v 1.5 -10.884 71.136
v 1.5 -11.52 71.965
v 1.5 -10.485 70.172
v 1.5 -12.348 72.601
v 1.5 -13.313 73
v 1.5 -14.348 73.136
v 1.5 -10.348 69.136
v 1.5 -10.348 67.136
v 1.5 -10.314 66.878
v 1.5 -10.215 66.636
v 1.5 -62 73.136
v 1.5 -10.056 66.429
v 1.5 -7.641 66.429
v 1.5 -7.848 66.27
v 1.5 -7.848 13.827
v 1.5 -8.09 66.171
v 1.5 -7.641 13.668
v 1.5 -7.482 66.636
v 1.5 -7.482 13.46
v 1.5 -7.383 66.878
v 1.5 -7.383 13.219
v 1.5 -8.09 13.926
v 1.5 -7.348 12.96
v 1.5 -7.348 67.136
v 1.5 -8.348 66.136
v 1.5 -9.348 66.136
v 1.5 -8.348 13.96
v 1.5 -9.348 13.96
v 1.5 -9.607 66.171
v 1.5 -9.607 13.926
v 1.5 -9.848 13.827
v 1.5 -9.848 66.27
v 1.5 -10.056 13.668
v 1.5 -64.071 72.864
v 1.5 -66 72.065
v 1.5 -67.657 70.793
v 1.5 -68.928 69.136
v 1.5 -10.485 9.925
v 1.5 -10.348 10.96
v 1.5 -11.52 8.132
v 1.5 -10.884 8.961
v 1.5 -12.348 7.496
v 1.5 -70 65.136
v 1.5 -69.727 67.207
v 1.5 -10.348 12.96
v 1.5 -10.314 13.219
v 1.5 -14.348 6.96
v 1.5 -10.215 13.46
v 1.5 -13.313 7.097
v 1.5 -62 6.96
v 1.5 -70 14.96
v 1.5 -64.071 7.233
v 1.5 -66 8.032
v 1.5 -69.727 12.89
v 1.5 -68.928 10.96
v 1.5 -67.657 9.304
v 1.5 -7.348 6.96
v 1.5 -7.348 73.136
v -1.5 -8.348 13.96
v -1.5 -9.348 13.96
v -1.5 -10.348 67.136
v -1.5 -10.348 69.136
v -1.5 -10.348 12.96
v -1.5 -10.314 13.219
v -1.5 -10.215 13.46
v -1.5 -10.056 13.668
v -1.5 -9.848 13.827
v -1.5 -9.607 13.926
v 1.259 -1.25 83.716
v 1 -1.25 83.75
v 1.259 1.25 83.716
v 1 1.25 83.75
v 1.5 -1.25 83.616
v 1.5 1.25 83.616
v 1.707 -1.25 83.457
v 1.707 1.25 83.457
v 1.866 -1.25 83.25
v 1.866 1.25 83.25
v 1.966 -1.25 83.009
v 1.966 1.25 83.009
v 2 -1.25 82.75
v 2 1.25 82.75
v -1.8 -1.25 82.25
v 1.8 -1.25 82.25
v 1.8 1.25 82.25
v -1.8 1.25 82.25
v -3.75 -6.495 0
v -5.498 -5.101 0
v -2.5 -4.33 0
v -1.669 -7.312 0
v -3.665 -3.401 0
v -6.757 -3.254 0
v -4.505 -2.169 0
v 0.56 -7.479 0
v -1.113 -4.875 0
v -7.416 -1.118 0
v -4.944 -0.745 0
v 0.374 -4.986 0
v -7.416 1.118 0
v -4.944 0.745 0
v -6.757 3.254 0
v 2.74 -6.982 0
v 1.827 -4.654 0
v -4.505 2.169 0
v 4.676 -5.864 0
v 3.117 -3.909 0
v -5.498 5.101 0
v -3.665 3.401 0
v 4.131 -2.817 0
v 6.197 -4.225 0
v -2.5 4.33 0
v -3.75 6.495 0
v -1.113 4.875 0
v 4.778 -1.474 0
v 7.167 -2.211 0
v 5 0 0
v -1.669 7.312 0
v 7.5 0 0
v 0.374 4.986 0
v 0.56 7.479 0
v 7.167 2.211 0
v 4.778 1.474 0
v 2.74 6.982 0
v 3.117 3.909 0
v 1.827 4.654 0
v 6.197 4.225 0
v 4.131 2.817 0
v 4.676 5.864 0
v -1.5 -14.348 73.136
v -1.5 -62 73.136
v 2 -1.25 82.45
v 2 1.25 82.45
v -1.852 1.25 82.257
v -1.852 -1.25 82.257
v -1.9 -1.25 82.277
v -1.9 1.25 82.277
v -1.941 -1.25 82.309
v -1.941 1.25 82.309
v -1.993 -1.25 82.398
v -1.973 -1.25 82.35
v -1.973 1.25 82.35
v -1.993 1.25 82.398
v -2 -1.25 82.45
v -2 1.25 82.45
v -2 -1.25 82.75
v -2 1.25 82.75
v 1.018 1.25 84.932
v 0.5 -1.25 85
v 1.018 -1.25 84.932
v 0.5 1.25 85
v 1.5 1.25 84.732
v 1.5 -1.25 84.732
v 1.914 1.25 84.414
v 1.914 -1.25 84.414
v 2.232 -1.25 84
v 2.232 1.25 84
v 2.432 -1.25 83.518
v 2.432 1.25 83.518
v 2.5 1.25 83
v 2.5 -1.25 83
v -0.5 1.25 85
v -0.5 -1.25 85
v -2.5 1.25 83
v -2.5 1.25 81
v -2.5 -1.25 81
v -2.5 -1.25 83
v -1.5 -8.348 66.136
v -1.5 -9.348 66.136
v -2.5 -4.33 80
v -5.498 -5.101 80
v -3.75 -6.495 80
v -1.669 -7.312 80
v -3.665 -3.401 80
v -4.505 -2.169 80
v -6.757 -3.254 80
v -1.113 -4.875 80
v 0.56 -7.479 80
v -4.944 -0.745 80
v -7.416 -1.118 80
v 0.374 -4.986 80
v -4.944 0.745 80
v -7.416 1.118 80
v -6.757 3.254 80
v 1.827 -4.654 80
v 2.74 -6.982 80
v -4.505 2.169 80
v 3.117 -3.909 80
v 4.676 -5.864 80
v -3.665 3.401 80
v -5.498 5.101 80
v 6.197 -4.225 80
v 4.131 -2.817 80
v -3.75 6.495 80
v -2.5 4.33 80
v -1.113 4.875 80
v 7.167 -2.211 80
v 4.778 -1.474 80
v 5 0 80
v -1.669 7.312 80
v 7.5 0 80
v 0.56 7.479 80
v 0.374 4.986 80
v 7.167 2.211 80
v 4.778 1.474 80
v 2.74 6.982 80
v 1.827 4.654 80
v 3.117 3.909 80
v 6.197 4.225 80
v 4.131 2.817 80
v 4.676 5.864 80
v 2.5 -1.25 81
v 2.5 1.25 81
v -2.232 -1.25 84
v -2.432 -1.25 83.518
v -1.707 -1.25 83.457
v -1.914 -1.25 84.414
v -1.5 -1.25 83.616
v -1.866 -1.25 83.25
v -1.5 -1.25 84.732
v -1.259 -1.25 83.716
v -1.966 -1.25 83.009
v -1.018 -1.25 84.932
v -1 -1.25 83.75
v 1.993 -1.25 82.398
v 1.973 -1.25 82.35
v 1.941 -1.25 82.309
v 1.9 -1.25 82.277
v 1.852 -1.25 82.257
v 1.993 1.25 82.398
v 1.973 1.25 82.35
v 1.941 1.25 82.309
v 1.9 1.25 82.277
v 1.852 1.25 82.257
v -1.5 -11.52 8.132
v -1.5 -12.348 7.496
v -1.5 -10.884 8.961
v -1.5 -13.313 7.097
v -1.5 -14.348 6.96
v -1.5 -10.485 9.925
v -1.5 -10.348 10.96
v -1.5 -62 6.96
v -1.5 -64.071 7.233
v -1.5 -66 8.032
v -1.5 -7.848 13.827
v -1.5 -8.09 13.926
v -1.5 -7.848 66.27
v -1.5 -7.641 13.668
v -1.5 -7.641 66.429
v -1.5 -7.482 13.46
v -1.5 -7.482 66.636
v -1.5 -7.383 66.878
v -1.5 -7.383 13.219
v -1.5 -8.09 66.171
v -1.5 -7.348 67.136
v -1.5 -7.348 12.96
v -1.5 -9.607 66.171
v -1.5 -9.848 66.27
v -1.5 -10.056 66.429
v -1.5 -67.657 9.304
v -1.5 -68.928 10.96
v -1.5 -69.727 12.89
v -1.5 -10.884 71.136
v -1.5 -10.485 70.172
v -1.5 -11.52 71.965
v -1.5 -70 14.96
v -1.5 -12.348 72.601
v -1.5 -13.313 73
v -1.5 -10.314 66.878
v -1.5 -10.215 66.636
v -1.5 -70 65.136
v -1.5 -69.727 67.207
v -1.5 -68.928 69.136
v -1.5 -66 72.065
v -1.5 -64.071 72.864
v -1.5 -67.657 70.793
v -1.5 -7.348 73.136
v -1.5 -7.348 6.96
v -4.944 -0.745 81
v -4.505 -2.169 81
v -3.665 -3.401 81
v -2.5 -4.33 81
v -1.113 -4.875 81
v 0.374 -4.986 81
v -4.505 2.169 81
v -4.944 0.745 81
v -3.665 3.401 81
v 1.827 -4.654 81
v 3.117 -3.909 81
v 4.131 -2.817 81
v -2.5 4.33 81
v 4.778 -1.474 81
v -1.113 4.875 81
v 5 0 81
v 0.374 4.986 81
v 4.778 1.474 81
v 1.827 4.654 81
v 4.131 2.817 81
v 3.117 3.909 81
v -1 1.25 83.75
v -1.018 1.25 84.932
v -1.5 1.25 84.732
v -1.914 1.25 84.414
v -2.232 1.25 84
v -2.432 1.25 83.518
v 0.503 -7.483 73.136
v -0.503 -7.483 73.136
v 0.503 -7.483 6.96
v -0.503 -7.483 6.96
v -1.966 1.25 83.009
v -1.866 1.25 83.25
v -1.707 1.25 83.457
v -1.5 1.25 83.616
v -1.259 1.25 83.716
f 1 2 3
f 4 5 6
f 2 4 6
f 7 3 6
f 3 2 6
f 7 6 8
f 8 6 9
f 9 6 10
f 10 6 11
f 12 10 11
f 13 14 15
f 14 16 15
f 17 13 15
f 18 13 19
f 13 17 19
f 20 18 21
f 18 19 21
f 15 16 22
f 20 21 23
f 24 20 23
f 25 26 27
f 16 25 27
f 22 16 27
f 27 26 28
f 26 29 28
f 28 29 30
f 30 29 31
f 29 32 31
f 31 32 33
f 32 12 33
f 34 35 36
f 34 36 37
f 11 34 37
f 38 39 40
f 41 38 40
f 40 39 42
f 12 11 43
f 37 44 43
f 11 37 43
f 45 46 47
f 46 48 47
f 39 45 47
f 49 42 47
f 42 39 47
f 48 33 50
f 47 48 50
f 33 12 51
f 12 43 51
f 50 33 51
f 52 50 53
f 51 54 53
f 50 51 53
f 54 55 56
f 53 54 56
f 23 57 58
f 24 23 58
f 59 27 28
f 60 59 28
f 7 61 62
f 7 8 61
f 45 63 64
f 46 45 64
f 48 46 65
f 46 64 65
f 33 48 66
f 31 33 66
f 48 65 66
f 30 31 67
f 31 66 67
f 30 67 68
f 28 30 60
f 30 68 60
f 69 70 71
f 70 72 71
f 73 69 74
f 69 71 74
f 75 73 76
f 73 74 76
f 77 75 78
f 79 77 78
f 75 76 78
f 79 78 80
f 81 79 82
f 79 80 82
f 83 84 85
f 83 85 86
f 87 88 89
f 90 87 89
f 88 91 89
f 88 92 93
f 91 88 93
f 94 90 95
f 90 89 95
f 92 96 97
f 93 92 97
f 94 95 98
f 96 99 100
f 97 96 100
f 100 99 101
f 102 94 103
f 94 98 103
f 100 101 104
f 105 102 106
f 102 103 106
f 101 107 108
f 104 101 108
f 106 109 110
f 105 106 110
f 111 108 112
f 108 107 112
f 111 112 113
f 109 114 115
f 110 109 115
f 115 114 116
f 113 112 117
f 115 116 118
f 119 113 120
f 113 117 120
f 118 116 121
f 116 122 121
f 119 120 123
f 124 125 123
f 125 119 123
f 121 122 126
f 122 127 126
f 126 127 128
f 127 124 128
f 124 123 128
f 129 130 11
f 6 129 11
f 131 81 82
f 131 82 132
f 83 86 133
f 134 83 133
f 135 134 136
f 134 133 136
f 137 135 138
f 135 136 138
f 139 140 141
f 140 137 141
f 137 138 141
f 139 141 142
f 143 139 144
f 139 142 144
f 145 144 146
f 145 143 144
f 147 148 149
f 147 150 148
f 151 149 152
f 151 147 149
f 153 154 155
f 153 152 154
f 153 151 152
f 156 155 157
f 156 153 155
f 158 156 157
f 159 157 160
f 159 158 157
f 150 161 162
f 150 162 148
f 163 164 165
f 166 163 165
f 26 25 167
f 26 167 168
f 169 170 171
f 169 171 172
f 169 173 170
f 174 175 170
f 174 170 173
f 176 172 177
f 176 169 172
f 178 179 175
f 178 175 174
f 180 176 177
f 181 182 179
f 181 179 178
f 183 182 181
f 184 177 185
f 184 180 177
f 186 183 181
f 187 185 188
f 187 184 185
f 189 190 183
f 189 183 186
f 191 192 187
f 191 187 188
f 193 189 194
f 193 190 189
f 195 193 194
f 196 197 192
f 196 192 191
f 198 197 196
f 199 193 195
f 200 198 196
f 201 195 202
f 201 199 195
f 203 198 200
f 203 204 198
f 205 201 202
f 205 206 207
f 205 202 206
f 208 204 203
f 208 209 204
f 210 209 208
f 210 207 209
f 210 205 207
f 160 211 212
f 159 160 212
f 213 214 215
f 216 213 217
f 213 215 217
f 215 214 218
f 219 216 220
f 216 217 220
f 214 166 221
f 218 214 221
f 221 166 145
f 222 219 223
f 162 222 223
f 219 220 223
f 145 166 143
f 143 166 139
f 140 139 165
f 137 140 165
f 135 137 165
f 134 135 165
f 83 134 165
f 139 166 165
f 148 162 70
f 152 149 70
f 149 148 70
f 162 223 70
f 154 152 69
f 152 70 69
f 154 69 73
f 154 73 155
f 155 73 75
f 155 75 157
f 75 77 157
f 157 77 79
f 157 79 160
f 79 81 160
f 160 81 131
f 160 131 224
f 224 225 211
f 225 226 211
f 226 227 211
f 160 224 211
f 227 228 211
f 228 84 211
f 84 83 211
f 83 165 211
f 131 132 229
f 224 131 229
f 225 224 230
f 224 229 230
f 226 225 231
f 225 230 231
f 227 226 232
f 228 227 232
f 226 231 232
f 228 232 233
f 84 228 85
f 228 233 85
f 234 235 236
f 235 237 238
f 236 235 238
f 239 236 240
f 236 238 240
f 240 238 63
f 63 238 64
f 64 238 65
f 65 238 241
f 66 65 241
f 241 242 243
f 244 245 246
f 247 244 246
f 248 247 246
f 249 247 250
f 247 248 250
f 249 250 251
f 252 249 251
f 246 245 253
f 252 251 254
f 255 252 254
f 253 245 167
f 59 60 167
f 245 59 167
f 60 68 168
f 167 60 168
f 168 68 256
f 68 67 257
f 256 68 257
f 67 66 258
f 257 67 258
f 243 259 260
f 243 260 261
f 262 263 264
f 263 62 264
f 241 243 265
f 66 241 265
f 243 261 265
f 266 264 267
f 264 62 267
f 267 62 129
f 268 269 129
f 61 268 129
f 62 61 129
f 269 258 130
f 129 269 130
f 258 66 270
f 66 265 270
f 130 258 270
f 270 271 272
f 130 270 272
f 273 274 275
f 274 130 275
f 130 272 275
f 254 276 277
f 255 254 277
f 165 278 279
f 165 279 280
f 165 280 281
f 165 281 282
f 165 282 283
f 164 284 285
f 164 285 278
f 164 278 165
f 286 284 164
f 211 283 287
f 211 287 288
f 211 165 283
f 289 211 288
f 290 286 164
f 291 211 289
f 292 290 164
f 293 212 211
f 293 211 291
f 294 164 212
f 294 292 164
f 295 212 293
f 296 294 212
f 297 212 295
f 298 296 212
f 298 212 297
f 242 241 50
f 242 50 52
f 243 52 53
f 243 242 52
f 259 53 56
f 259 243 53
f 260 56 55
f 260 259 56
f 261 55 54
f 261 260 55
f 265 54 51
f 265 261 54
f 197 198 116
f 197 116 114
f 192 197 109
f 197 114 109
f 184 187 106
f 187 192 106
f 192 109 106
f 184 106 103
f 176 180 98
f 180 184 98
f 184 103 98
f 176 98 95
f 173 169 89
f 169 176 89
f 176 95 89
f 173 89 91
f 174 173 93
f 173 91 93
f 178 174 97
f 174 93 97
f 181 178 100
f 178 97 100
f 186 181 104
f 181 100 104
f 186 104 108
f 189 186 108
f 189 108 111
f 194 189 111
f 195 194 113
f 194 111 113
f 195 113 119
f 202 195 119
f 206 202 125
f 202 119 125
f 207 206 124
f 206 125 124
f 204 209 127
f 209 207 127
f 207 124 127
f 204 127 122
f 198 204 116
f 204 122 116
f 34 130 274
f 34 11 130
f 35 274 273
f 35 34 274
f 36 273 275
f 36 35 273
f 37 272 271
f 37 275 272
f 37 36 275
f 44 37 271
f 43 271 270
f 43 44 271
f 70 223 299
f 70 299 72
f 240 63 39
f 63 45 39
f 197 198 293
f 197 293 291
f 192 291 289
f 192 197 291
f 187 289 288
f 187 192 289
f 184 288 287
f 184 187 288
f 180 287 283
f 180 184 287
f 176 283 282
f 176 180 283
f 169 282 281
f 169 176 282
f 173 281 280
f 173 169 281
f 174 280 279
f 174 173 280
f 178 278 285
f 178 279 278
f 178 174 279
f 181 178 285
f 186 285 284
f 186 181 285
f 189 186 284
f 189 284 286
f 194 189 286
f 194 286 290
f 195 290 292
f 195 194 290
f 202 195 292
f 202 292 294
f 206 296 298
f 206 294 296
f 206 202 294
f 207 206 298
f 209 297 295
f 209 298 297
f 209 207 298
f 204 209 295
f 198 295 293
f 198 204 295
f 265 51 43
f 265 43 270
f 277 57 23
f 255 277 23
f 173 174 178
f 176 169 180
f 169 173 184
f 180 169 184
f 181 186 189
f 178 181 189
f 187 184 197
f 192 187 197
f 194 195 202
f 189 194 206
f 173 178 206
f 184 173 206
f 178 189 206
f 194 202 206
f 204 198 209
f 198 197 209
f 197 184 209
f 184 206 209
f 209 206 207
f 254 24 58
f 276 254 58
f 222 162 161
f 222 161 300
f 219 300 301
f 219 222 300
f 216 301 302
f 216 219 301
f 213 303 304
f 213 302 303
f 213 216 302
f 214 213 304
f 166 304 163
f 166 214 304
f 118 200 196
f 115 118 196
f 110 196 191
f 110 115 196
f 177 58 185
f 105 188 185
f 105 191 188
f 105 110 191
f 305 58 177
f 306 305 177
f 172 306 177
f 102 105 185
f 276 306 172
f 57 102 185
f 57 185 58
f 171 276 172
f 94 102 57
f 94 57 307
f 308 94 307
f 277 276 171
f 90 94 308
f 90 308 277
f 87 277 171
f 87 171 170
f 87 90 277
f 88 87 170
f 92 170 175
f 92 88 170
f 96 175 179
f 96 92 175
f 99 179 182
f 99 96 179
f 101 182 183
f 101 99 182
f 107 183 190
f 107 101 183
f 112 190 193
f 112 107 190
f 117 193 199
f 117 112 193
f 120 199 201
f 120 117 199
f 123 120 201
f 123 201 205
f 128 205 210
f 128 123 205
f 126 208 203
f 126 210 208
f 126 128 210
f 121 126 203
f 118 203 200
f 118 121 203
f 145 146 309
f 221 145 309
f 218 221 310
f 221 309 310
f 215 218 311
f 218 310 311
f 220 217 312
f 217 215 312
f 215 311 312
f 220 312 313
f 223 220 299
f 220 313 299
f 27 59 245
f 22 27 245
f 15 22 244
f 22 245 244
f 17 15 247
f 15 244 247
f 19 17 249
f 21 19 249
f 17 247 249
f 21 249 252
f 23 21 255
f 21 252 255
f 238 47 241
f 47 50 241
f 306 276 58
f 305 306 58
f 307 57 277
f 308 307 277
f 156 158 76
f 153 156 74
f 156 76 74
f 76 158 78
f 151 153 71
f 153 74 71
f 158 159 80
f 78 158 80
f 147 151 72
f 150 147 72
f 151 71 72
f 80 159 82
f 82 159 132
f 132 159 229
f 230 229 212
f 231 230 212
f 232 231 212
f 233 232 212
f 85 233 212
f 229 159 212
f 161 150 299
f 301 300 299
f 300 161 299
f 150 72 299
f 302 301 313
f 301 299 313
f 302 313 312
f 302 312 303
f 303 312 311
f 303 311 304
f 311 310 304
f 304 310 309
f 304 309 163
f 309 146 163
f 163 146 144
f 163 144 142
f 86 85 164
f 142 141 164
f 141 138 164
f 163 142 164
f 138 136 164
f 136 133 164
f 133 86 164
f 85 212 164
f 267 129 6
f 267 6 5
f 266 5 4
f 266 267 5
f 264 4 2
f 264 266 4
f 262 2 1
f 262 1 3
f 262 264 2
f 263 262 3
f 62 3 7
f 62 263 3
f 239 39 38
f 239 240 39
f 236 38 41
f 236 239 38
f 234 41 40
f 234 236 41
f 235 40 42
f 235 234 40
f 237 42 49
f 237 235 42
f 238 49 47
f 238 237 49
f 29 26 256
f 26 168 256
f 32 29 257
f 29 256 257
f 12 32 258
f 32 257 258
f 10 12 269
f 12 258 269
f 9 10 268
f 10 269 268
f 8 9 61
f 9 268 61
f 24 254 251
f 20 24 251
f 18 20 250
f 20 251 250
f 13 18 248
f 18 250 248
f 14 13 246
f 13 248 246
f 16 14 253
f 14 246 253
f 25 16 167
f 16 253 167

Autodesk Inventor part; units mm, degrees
ref_plane "YZ Plane" through (0, 0, 0) normal (1, 0, 0) x (0, 1, 0)
ref_plane "XZ Plane" through (0, 0, 0) normal (0, 1, 0) x (-1, 0, 0)
ref_plane "XY Plane" through (0, 0, 0) normal (0, 0, 1) x (1, 0, 0)
sketch "Skizze4" plane through (0, 0, 0) normal (0, 0, 1) x (1, 0, 0)
  circle A0 centre (0, 0) radius 7.5
  circle A1 centre (0, 0) radius 5
  dimension "d5" = 15
  dimension "d8" = 10
extrude "Extrusion1" add sketch "Skizze4" along normal blind 80
sketch "Skizze5" plane through (0, 0, 0) normal (0, 1, 0) x (-1, 0, 0)
  line L0 (7.5, 80) -> (-7.5, 80) projected
  line L1 (7.5, 0) -> (-7.5, 0) projected
  line L2 (0, 0) -> (-3.4759, 0)
  line L3 (7.5, 0) -> (-7.5, 0) projected
  line L4 (0, 0) -> (0, 7)
  line L5 (7.5, 80) -> (-7.5, 80) projected
  line L6 (0, 80) -> (0, 73)
  line L7 (-5, 80) -> (-5, 0) projected
  line L8 (-1.5, 73.1365) -> (-1.5, 10.0002)
  line L9 (-7.5, 0) -> (-7.5, 80) projected
  line L10 (-1.5, 6.9605) -> (1.5, 6.9605)
  line L11 (5, 80) -> (5, 0) projected
  line L12 (1.5, 6.9605) -> (1.5, 73.1365)
  line L13 (1.5, 73.1365) -> (-1.566, 73.1365)
  line L14 (-1.5, 10.0002) -> (-1.5, 6.9605)
  point P0 (0, 70)
  dimension "d9" = 7
  dimension "d10" = 7
  dimension "d11" = 3
extrude "Extrusion2" add sketch "Skizze5" along normal blind 1 and the other way blind 70 contours L13 L12 L10 L14 L8
sketch "Skizze7" plane through (0, 0, 80) normal (0, 0, 1) x (1, 0, 0)
  circle A0 centre (0, 0) radius 7.5 projected
  circle A1 centre (0, 0) radius 5 projected
  arc A2 (-1.5, -4.7697) -> (1.5, -4.7697) centre (0, 0) ccw projected
  line L0 (-1.5, 1) -> (1.5, 1) projected
  line L1 (-1.5, 1) -> (-1.5, -4.7697) projected
  line L2 (-1.5, -4.7697) -> (-1.5, 1) projected
  line L3 (-1.5, -4.7697) -> (-1.5, 1)
  line L4 (1.5, 1) -> (-1.5, 1) projected
  line L5 (-1.5, 1) -> (1.5, 1)
  line L6 (1.5, 1) -> (1.5, -4.7697)
  arc A3 (-1.5, -4.7697) -> (1.5, -4.7697) centre (0, 0) ccw projected
  arc A4 (-1.5, -4.7697) -> (1.5, -4.7697) centre (0, -2.7697) ccw
  line L7 (1.5, -4.7697) -> (1.5, 1) projected
  point P0 (-1.5, -4.7697)
  point P1 (1.5, -4.7697)
  point P2 (1.5, -4.7697)
extrude "Extrusion4" cut sketch "Skizze7" against normal blind 80 contours A1 L6 L0 L1 | L1 L0 L6 A1
sketch "Skizze8" plane through (1.5, -70, 73.1365) normal (1, 0, 0) x (0, 0, -1)
  line L0 (66.176, 62.6515) -> (0, 62.6515) projected
  line L1 (66.176, 0) -> (66.176, 62.6515) projected
  line L2 (0, 0) -> (66.176, 0) projected
  line L3 (0, 62.6515) -> (0, 0) projected
  line L4 (66.176, 62.6515) -> (0, 62.6515) projected
  line L5 (0, 62.6515) -> (7, 62.6515)
  line L6 (66.176, 62.5) -> (66.176, 62.6515) projected
  line L7 (66.176, 62.6515) -> (59.176, 62.6515)
  line L8 (7, 62.6515) -> (7, 59.6515)
  line L9 (33.088, 62.6515) -> (33.088, 0)
  line L10 (0, 0) -> (66.176, 0) projected
  line L11 (7, 59.6515) -> (0, 59.6515)
  line L12 (0, 62.6515) -> (0, 0) projected
  line L13 (0, 59.6515) -> (0, 0)
  line L14 (0, 0) -> (33.088, 0)
  line L15 (66.176, 0) -> (66.176, 62.6515)
  line L16 (59.176, 62.6515) -> (59.176, 59.6515)
  line L17 (59.176, 59.6515) -> (66.176, 59.6515)
  line L18 (66.176, 0) -> (33.088, 0)
  line L19 (7, 62.6515) -> (59.176, 62.6515)
  line L20 (0, 59.6515) -> (0, 62.6515)
  line L21 (66.176, 59.6515) -> (66.176, 62.5)
  point P0 (73.1365, 70)
  dimension "d20" = 7
  dimension "d21" = 7
  dimension "d22" = 3
extrude "Extrusion5" cut sketch "Skizze8" against normal blind 5 contours L1 L17 L16 L0 | L8 L11 L3 L0
fillet "Rundung7" radius 1 4 edges at (0, -7.3485, 66.1365) (0, -10.3485, 66.1365) (0, -7.3485, 13.9605) (0, -10.3485, 13.9605)
fillet "Rundung8" radius 4 2 edges at (0, -10.3485, 6.9605) (0, -10.3485, 73.1365)
fillet "Rundung9" radius 8 2 edges at (0, -70, 73.1365) (0, -70, 6.9605)
sketch "Skizze9" plane through (0, 0, 80) normal (0, 0, 1) x (1, 0, 0)
  circle A0 centre (0, 0) radius 7.5 projected
  circle A1 centre (0, 0) radius 5 projected
  circle A2 centre (0, 0) radius 5
  line L0 (2.5, 1.25) -> (-2.5, 1.25)
  line L1 (-2.5, 1.25) -> (-2.5, -1.25)
  line L2 (-2.5, -1.25) -> (2.5, -1.25)
  line L3 (2.5, -1.25) -> (2.5, 1.25)
  line L4 (0, 1.25) -> (0, -1.25)
  dimension "d37" = 10
  dimension "d38" = 5
  dimension "d39" = 2.5
extrude "Extrusion6" add sketch "Skizze9" along normal blind 1 contours A1
extrude "Extrusion7" add sketch "Skizze9" along normal blind 5 contours L3 L2 L4 L0 | L4 L2 L1 L0
sketch "Skizze10" plane through (-2.5, -1.25, 81) normal (0, -1, 0) x (1, 0, 0)
  line L0 (0, 0) -> (5, 0) projected
  line L1 (0, 0) -> (0, 4) projected
  line L2 (5, 4) -> (0, 4) projected
  line L3 (5, 0) -> (5, 4) projected
  line L4 (5, 4) -> (0, 4) projected
  line L5 (7.5, 0) -> (-2.5, 0) projected
  line L6 (0, 0) -> (0, 4) projected
  line L7 (5, 0) -> (5, 4) projected
  line L8 (0.5, 2.75) -> (4.5, 2.75)
  line L9 (4.5, 2.75) -> (4.5, 1.25)
  line L10 (4.5, 1.25) -> (0.5, 1.25)
  line L11 (0.5, 1.25) -> (0.5, 2.75)
  line L12 (2.5, 4) -> (2.5, 0)
  line L13 (0.5, 2) -> (4.5, 2)
  point P0 (2.5, -81)
  point P1 (2.5, 2)
  point P2 (2.5, 2)
  dimension "d44" = 4
  dimension "d45" = 1.5
extrude "Extrusion8" cut sketch "Skizze10" against normal blind 5 contours L12 L13 L9 L10 | L10 L11 L13 L12 | L13 L11 L8 L12 | L12 L8 L9 L13
fillet "Rundung10" radius 2 2 edges at (-2.5, 0, 85) (2.5, 0, 85)
fillet "Rundung11" radius 1 1 edges at (-2, 0, 83.75)
fillet "Rundung11" radius 1 1 edges at (2, 0, 83.75)
fillet "Rundung12" radius 0.2 1 edges at (2, 0, 82.25)
fillet "Rundung12" radius 0.2 1 edges at (-2, 0, 82.25)
equation "\"d5\" = Durchmesser1"
equation "\"d8\" = Durchmesser3"
equation "\"d6\" = Länge1"
equation "\"d9\" = Größe1"
equation "\"d10\" = Größe1"
equation "\"d11\" = Durchmesser2"
equation "\"d13\" = Größe2"
equation "\"d20\" = Größe1"
equation "\"d21\" = Größe1"
equation "\"d22\" = Größe3"
equation "\"Durchmesser1\" = 15"
equation "\"Länge1\" = 80"
equation "\"Größe1\" = 7"
equation "\"Durchmesser2\" = 3"
equation "\"Durchmesser3\" = 10"
equation "\"Größe2\" = 70"
equation "\"Größe3\" = 3"
equation "\"Größe4\" = 15"
properties part number "Ruder"
